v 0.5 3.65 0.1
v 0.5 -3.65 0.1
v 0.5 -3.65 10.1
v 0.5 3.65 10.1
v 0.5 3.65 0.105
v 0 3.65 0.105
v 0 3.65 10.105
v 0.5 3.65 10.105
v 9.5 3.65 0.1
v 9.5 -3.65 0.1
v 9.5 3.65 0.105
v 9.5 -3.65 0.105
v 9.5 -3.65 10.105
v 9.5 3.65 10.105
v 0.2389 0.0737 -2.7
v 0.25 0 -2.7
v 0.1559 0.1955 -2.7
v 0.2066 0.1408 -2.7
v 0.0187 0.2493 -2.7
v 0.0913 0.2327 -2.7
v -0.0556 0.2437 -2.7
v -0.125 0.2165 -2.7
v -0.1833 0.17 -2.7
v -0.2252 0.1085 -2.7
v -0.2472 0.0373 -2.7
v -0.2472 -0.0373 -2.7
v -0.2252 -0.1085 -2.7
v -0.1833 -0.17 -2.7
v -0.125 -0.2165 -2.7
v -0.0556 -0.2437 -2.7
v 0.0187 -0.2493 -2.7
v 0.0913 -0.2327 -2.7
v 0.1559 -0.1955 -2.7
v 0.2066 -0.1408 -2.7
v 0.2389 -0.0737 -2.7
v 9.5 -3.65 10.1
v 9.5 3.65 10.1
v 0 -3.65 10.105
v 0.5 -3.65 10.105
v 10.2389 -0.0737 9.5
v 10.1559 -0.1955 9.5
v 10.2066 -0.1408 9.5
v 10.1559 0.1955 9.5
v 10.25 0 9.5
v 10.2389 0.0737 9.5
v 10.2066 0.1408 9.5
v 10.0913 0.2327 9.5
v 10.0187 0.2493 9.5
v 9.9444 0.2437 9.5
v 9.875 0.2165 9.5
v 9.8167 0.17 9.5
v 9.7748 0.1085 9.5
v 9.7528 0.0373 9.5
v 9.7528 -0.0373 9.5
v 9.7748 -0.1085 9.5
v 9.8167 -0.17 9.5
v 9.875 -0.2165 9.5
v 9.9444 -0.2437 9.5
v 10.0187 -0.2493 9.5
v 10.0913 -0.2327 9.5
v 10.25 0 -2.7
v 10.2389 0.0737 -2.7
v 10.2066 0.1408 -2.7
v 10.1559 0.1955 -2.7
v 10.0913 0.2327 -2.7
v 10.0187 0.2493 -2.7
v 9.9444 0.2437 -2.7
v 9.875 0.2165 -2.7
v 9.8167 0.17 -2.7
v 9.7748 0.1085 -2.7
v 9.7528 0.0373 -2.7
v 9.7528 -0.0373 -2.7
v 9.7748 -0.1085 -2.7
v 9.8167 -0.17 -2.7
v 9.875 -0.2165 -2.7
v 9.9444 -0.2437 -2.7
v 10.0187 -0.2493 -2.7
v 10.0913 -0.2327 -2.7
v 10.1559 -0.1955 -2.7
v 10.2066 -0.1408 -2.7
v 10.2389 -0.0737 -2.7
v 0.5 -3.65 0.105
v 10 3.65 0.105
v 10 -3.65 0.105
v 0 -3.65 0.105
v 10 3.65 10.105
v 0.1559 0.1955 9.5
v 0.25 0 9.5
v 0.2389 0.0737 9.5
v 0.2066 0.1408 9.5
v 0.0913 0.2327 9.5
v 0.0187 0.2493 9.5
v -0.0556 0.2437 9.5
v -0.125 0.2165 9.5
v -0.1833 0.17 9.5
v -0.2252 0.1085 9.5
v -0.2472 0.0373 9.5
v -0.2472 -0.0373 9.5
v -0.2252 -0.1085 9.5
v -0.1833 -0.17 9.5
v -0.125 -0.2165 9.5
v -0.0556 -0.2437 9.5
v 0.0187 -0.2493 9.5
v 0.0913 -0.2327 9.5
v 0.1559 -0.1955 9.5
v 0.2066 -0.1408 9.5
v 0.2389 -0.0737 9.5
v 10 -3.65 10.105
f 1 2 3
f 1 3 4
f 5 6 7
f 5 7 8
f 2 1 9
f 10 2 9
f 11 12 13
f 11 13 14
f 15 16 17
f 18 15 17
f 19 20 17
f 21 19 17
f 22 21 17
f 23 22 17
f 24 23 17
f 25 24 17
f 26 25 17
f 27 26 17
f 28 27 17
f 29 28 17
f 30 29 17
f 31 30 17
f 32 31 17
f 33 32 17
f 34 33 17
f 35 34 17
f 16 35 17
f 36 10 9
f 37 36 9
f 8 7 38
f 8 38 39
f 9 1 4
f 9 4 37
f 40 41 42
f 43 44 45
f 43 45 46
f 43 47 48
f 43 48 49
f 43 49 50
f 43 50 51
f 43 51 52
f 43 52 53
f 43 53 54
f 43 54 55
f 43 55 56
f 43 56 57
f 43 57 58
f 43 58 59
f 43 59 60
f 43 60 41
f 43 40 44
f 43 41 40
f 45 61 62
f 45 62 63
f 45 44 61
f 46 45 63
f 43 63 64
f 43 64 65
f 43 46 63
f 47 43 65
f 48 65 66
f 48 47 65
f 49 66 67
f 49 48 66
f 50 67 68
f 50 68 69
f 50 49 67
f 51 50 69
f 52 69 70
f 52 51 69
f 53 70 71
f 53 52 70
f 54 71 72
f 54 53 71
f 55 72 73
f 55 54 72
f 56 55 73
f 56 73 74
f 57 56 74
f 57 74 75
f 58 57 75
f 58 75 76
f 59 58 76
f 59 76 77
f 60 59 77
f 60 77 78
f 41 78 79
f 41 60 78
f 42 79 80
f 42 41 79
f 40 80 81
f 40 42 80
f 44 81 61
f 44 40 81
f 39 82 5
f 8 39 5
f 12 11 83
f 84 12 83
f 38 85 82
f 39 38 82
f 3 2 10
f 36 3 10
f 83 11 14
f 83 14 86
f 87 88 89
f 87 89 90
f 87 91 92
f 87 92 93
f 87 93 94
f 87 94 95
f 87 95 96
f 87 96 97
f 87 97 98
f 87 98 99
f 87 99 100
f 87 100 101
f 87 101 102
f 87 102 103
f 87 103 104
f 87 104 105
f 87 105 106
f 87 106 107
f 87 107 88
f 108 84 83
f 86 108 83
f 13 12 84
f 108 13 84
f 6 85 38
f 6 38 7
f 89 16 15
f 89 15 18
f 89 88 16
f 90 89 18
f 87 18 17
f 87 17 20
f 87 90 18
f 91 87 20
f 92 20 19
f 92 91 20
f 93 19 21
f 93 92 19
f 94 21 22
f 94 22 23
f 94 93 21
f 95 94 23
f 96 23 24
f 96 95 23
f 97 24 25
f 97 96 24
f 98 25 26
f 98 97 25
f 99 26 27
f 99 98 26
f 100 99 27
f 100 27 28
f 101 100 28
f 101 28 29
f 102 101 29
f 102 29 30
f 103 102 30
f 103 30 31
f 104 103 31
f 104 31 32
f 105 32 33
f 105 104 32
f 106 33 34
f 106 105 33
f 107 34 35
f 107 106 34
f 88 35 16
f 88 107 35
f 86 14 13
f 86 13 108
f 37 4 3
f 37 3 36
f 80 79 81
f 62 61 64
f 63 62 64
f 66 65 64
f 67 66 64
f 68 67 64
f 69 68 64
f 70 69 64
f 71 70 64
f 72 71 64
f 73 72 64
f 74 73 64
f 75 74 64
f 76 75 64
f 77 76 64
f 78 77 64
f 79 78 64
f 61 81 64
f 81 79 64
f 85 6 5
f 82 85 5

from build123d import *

# Parameters (mm, degrees)
SKETCH_W          = 9
SKETCH_H          = 7.3
PAD_DEPTH         = 10
SKETCH001_R       = 0.25
PAD001_DEPTH      = 9
PAD001_DEPTH_BACK = 3.2
SKETCH002_W       = 0.5
SKETCH002_H       = 7.3
PAD002_DEPTH      = 10


with BuildPart() as pad:
    # Sketch → Pad (new body)
    with BuildSketch(Plane.XY.offset(0.1)):
        with Locations((5, 0)):
            Rectangle(SKETCH_W, SKETCH_H)
    extrude(amount=PAD_DEPTH)


with BuildPart() as pad001:
    # Sketch001 → Pad001 (new body, two sides)
    with BuildSketch(Plane.XY.offset(0.5)) as pad001_sk:
        Circle(SKETCH001_R)
        with Locations((10, 0)):
            Circle(SKETCH001_R)
    extrude(amount=PAD001_DEPTH)
    extrude(pad001_sk.sketch, amount=-PAD001_DEPTH_BACK)


with BuildPart() as pad002:
    # Sketch002 → Pad002 (new body)
    with BuildSketch(Plane.XY.offset(0.105)):
        with Locations((0.25, 0)):
            Rectangle(SKETCH002_W, SKETCH002_H)
        with Locations((9.75, 0)):
            Rectangle(SKETCH002_W, SKETCH002_H)
    extrude(amount=PAD002_DEPTH)


solid = Compound([pad.part, pad001.part, pad002.part])
